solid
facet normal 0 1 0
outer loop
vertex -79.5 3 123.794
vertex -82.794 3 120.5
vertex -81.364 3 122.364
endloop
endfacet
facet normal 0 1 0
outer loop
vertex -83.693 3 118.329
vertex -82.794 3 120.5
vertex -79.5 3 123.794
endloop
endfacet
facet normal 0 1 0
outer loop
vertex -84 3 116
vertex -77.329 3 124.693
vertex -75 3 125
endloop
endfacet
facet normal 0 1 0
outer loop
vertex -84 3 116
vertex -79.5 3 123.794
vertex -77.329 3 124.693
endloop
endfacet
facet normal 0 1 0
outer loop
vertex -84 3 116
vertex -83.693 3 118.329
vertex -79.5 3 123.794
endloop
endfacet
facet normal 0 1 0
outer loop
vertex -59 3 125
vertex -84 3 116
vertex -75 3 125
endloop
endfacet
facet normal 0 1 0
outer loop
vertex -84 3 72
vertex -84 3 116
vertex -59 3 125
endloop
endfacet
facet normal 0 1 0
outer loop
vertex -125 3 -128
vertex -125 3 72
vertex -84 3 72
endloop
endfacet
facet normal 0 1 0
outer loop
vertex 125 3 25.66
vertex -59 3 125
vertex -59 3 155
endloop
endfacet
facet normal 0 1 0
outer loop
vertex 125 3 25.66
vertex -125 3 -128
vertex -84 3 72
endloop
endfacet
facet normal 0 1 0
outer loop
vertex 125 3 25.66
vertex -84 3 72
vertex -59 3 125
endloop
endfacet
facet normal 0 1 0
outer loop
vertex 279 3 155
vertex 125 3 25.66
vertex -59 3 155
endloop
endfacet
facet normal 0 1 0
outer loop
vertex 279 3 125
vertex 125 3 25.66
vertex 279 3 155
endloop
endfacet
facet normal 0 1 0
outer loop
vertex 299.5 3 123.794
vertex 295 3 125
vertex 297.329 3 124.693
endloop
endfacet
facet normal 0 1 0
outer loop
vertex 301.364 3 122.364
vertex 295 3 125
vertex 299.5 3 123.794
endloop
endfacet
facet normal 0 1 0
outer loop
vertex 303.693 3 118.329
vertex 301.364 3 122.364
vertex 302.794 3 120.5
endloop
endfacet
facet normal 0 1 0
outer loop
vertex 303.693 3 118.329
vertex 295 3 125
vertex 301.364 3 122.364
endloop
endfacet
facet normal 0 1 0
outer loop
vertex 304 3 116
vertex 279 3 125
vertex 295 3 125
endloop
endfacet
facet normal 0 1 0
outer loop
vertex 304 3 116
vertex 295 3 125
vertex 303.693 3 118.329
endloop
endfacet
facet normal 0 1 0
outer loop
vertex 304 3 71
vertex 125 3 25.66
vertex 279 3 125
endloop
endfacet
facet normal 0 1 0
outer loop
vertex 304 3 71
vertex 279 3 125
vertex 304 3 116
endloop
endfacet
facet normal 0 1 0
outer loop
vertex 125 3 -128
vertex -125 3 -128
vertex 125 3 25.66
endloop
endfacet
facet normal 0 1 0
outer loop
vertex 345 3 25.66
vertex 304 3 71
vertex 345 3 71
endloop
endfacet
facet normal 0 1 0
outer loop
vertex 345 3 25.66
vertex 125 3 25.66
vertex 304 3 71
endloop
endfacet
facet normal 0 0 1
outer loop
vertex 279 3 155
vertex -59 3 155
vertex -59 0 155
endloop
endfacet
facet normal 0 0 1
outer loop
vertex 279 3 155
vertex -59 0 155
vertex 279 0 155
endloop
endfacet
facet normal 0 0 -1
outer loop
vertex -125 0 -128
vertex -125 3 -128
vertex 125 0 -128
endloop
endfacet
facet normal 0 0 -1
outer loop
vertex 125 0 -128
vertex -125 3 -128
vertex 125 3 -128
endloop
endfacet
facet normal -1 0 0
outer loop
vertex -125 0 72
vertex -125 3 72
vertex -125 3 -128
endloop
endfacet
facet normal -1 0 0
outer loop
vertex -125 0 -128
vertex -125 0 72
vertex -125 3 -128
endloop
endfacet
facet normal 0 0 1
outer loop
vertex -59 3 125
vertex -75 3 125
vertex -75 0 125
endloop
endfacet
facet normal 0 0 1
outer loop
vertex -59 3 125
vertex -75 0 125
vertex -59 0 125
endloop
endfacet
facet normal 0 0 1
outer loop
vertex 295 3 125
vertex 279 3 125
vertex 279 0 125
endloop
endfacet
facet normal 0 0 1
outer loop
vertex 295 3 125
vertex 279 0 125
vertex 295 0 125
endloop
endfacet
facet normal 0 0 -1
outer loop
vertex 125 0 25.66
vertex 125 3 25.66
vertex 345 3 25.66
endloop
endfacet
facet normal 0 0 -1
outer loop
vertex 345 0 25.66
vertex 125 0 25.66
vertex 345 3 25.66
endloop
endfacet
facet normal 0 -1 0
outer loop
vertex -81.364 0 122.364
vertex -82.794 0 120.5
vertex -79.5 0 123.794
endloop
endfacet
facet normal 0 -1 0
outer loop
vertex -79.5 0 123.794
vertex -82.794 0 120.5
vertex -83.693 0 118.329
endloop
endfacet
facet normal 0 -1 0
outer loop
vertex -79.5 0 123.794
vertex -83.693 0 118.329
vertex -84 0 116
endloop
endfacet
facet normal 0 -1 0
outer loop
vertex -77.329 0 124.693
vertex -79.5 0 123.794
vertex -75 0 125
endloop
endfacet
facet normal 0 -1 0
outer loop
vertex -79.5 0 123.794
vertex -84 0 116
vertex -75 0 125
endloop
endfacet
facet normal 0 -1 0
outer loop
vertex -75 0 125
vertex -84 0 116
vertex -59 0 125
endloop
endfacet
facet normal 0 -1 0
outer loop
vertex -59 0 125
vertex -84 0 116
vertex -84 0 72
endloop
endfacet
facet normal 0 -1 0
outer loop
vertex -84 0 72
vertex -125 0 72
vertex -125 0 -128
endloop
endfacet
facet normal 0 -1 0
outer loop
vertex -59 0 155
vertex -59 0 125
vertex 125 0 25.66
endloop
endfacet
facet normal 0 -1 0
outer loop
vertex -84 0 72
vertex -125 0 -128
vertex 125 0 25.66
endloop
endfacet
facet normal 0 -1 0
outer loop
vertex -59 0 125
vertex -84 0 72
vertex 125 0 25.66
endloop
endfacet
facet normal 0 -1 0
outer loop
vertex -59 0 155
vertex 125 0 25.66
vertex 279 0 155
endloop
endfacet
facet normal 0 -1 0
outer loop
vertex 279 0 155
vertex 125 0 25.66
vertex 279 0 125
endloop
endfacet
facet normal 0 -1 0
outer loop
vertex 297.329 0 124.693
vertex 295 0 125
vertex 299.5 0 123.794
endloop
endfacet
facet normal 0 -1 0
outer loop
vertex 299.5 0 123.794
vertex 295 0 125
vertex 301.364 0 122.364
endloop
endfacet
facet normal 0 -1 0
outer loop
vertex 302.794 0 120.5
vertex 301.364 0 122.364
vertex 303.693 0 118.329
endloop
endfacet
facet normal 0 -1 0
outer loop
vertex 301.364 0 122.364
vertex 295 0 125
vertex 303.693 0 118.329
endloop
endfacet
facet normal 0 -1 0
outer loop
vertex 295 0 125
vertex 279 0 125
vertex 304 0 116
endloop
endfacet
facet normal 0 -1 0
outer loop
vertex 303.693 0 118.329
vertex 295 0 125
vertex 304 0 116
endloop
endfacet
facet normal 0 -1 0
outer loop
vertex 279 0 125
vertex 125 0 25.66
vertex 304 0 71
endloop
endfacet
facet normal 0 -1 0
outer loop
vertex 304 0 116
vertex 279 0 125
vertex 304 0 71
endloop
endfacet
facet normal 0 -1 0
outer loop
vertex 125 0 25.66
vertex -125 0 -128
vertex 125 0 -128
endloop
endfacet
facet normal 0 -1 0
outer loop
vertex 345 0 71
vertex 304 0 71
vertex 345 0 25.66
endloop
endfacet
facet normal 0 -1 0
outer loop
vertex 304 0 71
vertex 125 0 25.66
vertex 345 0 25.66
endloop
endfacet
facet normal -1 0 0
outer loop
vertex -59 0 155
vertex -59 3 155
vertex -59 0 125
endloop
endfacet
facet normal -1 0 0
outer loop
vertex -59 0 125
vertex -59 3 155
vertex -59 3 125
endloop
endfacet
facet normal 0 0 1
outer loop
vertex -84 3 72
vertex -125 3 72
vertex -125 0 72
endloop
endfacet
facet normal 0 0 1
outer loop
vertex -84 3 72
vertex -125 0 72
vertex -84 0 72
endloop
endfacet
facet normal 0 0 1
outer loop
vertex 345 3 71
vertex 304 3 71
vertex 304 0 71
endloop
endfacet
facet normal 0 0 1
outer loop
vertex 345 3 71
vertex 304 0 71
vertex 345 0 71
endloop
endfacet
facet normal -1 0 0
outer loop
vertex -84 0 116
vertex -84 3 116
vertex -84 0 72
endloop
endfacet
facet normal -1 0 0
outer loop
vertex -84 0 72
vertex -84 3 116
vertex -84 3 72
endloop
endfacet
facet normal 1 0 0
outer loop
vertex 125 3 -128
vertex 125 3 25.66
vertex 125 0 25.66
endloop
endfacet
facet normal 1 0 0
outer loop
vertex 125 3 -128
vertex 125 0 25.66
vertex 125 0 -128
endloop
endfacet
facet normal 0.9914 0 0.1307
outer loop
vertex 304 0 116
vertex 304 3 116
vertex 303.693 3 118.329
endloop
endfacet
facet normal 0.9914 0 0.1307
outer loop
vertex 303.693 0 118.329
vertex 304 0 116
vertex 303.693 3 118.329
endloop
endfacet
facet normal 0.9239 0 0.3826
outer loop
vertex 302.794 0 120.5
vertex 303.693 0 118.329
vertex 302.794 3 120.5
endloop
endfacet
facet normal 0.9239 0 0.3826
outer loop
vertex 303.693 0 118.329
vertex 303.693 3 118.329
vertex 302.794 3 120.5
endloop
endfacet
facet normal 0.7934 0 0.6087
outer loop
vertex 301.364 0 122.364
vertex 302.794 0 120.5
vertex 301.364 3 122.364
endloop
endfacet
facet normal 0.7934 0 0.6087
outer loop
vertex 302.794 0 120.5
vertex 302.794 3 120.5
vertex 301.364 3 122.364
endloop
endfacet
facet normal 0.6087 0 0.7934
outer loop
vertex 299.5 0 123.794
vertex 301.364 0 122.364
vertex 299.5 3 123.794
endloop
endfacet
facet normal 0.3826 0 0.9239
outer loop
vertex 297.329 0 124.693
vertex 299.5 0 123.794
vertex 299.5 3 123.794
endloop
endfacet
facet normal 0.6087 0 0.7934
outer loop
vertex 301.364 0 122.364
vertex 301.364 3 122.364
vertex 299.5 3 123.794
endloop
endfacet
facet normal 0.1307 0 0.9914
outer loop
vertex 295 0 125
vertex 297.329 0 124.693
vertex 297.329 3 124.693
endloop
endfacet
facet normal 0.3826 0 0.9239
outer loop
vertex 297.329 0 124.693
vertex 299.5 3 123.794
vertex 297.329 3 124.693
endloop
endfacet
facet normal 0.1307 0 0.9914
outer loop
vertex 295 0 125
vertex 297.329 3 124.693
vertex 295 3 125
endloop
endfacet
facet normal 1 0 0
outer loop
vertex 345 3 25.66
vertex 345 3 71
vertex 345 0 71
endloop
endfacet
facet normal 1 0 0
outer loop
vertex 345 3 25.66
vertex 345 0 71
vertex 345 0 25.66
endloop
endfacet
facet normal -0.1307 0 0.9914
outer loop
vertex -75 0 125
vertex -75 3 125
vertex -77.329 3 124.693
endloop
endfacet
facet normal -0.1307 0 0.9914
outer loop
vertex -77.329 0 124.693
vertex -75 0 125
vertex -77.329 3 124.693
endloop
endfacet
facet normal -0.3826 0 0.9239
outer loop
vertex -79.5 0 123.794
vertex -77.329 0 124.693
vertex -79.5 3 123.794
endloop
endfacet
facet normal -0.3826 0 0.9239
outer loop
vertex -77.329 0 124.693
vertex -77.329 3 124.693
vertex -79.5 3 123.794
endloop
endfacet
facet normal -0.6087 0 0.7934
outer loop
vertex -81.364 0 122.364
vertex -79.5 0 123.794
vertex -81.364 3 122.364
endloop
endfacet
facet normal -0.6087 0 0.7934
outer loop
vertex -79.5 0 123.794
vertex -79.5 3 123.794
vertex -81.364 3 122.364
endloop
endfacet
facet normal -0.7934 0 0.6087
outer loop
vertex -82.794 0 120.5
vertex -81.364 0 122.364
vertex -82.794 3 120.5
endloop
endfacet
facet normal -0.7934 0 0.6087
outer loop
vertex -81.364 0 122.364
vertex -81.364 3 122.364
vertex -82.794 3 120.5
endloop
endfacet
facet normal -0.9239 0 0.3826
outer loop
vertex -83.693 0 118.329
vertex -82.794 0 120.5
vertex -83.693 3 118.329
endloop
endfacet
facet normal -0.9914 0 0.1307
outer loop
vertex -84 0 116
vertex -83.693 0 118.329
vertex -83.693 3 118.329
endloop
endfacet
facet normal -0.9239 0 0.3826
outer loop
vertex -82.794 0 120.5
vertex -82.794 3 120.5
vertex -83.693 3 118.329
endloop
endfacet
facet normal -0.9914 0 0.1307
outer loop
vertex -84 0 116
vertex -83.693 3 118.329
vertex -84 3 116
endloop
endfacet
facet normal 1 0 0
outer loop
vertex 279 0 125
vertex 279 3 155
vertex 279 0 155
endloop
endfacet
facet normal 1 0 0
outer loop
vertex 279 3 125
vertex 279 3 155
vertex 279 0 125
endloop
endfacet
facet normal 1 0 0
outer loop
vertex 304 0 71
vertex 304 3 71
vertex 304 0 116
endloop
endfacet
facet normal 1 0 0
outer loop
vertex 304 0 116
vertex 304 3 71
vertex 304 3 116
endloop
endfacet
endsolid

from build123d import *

# Parameters (mm, degrees)
CROQUIS1_W              = 250
CROQUIS1_H              = 250
SALIENTE_EXTRUIR1_DEPTH = 3
CROQUIS2_W              = 250
CROQUIS2_H              = 3
SALIENTE_EXTRUIR2_DEPTH = 3
CROQUIS3_W              = 220
CROQUIS3_H              = 99.34
SALIENTE_EXTRUIR4_DEPTH = 3
CROQUIS4_W              = 41
CROQUIS4_H              = 52
CORTAR_EXTRUIR1_DEPTH   = 3
CORTAR_EXTRUIR2_DEPTH   = 3
CROQUIS6_W              = 339
CROQUIS6_H              = 30
SALIENTE_EXTRUIR5_DEPTH = 3
CORTAR_EXTRUIR3_DEPTH   = 3
CROQUIS8_W              = 1
CROQUIS8_H              = 30
CORTAR_EXTRUIR4_DEPTH   = 10
CROQUIS10_W             = 41
CROQUIS10_H             = 1
CORTAR_EXTRUIR5_DEPTH   = 3


with BuildPart() as part:
    # Croquis1 → Saliente-Extruir1 (new body)
    with BuildSketch(Plane(origin=(0, 0, 0), x_dir=(1, 0, 0), z_dir=(0, 1, 0))):
        Rectangle(CROQUIS1_W, CROQUIS1_H)
    extrude(amount=SALIENTE_EXTRUIR1_DEPTH)

    # Croquis2 → Saliente-Extruir2 (add)
    with BuildSketch(Plane(origin=(0, 3, 0), x_dir=(1, 0, 0), z_dir=(0, 1, 0))):
        with Locations((0, 126.5)):
            Rectangle(CROQUIS2_W, CROQUIS2_H)
    extrude(amount=-SALIENTE_EXTRUIR2_DEPTH)

    # Croquis3 → Saliente-Extruir4 (add)
    with BuildSketch(Plane(origin=(0, 3, 0), x_dir=(1, 0, 0), z_dir=(0, 1, 0))):
        with Locations((235, -75.33)):
            Rectangle(CROQUIS3_W, CROQUIS3_H)
    extrude(amount=-SALIENTE_EXTRUIR4_DEPTH)

    # Croquis4 → Cortar-Extruir1 (cut)
    with BuildSketch(Plane(origin=(0, 3, 0), x_dir=(1, 0, 0), z_dir=(0, 1, 0))):
        with Locations((-104.5, -99)):
            Rectangle(CROQUIS4_W, CROQUIS4_H)
    extrude(amount=-CORTAR_EXTRUIR1_DEPTH, mode=Mode.SUBTRACT)

    # Croquis5 → Cortar-Extruir2 (cut)
    with BuildSketch(Plane(origin=(0, 3, 0), x_dir=(1, 0, 0), z_dir=(0, 1, 0))):
        with BuildLine():
            Line((-84, -116), (-84, -125))
            Line((-84, -125), (-75, -125))
            ThreePointArc((-75, -125), (-81.363961031, -122.363961031), (-84, -116))
        make_face()
    extrude(amount=-CORTAR_EXTRUIR2_DEPTH, mode=Mode.SUBTRACT)

    # Croquis6 → Saliente-Extruir5 (add)
    with BuildSketch(Plane(origin=(0, 3, 0), x_dir=(1, 0, 0), z_dir=(0, 1, 0))):
        with Locations((110.5, -140)):
            Rectangle(CROQUIS6_W, CROQUIS6_H)
    extrude(amount=-SALIENTE_EXTRUIR5_DEPTH)

    # Croquis7 → Cortar-Extruir3 (cut)
    with BuildSketch(Plane(origin=(0, 3, 0), x_dir=(1, 0, 0), z_dir=(0, 1, 0))):
        with BuildLine():
            Line((345, -72), (304, -72))
            Line((304, -72), (304, -116))
            ThreePointArc((304, -116), (301.363961031, -122.363961031), (295, -125))
            Line((295, -125), (345, -125))
            Line((345, -125), (345, -72))
        make_face()
    extrude(amount=-CORTAR_EXTRUIR3_DEPTH, mode=Mode.SUBTRACT)

    # Croquis8 → Cortar-Extruir4 (cut)
    with BuildSketch(Plane(origin=(0, 3, 0), x_dir=(1, 0, 0), z_dir=(0, 1, 0))):
        with Locations((279.5, -140)):
            Rectangle(CROQUIS8_W, CROQUIS8_H)
    extrude(amount=-CORTAR_EXTRUIR4_DEPTH, mode=Mode.SUBTRACT)

    # Croquis10 → Cortar-Extruir5 (cut)
    with BuildSketch(Plane(origin=(0, 3, 0), x_dir=(1, 0, 0), z_dir=(0, 1, 0))):
        with Locations((-104.5, -72.5)):
            Rectangle(CROQUIS10_W, CROQUIS10_H)
        with Locations((324.5, -71.5)):
            Rectangle(CROQUIS10_W, CROQUIS10_H)
    extrude(amount=-CORTAR_EXTRUIR5_DEPTH, mode=Mode.SUBTRACT)


solid = part.part
